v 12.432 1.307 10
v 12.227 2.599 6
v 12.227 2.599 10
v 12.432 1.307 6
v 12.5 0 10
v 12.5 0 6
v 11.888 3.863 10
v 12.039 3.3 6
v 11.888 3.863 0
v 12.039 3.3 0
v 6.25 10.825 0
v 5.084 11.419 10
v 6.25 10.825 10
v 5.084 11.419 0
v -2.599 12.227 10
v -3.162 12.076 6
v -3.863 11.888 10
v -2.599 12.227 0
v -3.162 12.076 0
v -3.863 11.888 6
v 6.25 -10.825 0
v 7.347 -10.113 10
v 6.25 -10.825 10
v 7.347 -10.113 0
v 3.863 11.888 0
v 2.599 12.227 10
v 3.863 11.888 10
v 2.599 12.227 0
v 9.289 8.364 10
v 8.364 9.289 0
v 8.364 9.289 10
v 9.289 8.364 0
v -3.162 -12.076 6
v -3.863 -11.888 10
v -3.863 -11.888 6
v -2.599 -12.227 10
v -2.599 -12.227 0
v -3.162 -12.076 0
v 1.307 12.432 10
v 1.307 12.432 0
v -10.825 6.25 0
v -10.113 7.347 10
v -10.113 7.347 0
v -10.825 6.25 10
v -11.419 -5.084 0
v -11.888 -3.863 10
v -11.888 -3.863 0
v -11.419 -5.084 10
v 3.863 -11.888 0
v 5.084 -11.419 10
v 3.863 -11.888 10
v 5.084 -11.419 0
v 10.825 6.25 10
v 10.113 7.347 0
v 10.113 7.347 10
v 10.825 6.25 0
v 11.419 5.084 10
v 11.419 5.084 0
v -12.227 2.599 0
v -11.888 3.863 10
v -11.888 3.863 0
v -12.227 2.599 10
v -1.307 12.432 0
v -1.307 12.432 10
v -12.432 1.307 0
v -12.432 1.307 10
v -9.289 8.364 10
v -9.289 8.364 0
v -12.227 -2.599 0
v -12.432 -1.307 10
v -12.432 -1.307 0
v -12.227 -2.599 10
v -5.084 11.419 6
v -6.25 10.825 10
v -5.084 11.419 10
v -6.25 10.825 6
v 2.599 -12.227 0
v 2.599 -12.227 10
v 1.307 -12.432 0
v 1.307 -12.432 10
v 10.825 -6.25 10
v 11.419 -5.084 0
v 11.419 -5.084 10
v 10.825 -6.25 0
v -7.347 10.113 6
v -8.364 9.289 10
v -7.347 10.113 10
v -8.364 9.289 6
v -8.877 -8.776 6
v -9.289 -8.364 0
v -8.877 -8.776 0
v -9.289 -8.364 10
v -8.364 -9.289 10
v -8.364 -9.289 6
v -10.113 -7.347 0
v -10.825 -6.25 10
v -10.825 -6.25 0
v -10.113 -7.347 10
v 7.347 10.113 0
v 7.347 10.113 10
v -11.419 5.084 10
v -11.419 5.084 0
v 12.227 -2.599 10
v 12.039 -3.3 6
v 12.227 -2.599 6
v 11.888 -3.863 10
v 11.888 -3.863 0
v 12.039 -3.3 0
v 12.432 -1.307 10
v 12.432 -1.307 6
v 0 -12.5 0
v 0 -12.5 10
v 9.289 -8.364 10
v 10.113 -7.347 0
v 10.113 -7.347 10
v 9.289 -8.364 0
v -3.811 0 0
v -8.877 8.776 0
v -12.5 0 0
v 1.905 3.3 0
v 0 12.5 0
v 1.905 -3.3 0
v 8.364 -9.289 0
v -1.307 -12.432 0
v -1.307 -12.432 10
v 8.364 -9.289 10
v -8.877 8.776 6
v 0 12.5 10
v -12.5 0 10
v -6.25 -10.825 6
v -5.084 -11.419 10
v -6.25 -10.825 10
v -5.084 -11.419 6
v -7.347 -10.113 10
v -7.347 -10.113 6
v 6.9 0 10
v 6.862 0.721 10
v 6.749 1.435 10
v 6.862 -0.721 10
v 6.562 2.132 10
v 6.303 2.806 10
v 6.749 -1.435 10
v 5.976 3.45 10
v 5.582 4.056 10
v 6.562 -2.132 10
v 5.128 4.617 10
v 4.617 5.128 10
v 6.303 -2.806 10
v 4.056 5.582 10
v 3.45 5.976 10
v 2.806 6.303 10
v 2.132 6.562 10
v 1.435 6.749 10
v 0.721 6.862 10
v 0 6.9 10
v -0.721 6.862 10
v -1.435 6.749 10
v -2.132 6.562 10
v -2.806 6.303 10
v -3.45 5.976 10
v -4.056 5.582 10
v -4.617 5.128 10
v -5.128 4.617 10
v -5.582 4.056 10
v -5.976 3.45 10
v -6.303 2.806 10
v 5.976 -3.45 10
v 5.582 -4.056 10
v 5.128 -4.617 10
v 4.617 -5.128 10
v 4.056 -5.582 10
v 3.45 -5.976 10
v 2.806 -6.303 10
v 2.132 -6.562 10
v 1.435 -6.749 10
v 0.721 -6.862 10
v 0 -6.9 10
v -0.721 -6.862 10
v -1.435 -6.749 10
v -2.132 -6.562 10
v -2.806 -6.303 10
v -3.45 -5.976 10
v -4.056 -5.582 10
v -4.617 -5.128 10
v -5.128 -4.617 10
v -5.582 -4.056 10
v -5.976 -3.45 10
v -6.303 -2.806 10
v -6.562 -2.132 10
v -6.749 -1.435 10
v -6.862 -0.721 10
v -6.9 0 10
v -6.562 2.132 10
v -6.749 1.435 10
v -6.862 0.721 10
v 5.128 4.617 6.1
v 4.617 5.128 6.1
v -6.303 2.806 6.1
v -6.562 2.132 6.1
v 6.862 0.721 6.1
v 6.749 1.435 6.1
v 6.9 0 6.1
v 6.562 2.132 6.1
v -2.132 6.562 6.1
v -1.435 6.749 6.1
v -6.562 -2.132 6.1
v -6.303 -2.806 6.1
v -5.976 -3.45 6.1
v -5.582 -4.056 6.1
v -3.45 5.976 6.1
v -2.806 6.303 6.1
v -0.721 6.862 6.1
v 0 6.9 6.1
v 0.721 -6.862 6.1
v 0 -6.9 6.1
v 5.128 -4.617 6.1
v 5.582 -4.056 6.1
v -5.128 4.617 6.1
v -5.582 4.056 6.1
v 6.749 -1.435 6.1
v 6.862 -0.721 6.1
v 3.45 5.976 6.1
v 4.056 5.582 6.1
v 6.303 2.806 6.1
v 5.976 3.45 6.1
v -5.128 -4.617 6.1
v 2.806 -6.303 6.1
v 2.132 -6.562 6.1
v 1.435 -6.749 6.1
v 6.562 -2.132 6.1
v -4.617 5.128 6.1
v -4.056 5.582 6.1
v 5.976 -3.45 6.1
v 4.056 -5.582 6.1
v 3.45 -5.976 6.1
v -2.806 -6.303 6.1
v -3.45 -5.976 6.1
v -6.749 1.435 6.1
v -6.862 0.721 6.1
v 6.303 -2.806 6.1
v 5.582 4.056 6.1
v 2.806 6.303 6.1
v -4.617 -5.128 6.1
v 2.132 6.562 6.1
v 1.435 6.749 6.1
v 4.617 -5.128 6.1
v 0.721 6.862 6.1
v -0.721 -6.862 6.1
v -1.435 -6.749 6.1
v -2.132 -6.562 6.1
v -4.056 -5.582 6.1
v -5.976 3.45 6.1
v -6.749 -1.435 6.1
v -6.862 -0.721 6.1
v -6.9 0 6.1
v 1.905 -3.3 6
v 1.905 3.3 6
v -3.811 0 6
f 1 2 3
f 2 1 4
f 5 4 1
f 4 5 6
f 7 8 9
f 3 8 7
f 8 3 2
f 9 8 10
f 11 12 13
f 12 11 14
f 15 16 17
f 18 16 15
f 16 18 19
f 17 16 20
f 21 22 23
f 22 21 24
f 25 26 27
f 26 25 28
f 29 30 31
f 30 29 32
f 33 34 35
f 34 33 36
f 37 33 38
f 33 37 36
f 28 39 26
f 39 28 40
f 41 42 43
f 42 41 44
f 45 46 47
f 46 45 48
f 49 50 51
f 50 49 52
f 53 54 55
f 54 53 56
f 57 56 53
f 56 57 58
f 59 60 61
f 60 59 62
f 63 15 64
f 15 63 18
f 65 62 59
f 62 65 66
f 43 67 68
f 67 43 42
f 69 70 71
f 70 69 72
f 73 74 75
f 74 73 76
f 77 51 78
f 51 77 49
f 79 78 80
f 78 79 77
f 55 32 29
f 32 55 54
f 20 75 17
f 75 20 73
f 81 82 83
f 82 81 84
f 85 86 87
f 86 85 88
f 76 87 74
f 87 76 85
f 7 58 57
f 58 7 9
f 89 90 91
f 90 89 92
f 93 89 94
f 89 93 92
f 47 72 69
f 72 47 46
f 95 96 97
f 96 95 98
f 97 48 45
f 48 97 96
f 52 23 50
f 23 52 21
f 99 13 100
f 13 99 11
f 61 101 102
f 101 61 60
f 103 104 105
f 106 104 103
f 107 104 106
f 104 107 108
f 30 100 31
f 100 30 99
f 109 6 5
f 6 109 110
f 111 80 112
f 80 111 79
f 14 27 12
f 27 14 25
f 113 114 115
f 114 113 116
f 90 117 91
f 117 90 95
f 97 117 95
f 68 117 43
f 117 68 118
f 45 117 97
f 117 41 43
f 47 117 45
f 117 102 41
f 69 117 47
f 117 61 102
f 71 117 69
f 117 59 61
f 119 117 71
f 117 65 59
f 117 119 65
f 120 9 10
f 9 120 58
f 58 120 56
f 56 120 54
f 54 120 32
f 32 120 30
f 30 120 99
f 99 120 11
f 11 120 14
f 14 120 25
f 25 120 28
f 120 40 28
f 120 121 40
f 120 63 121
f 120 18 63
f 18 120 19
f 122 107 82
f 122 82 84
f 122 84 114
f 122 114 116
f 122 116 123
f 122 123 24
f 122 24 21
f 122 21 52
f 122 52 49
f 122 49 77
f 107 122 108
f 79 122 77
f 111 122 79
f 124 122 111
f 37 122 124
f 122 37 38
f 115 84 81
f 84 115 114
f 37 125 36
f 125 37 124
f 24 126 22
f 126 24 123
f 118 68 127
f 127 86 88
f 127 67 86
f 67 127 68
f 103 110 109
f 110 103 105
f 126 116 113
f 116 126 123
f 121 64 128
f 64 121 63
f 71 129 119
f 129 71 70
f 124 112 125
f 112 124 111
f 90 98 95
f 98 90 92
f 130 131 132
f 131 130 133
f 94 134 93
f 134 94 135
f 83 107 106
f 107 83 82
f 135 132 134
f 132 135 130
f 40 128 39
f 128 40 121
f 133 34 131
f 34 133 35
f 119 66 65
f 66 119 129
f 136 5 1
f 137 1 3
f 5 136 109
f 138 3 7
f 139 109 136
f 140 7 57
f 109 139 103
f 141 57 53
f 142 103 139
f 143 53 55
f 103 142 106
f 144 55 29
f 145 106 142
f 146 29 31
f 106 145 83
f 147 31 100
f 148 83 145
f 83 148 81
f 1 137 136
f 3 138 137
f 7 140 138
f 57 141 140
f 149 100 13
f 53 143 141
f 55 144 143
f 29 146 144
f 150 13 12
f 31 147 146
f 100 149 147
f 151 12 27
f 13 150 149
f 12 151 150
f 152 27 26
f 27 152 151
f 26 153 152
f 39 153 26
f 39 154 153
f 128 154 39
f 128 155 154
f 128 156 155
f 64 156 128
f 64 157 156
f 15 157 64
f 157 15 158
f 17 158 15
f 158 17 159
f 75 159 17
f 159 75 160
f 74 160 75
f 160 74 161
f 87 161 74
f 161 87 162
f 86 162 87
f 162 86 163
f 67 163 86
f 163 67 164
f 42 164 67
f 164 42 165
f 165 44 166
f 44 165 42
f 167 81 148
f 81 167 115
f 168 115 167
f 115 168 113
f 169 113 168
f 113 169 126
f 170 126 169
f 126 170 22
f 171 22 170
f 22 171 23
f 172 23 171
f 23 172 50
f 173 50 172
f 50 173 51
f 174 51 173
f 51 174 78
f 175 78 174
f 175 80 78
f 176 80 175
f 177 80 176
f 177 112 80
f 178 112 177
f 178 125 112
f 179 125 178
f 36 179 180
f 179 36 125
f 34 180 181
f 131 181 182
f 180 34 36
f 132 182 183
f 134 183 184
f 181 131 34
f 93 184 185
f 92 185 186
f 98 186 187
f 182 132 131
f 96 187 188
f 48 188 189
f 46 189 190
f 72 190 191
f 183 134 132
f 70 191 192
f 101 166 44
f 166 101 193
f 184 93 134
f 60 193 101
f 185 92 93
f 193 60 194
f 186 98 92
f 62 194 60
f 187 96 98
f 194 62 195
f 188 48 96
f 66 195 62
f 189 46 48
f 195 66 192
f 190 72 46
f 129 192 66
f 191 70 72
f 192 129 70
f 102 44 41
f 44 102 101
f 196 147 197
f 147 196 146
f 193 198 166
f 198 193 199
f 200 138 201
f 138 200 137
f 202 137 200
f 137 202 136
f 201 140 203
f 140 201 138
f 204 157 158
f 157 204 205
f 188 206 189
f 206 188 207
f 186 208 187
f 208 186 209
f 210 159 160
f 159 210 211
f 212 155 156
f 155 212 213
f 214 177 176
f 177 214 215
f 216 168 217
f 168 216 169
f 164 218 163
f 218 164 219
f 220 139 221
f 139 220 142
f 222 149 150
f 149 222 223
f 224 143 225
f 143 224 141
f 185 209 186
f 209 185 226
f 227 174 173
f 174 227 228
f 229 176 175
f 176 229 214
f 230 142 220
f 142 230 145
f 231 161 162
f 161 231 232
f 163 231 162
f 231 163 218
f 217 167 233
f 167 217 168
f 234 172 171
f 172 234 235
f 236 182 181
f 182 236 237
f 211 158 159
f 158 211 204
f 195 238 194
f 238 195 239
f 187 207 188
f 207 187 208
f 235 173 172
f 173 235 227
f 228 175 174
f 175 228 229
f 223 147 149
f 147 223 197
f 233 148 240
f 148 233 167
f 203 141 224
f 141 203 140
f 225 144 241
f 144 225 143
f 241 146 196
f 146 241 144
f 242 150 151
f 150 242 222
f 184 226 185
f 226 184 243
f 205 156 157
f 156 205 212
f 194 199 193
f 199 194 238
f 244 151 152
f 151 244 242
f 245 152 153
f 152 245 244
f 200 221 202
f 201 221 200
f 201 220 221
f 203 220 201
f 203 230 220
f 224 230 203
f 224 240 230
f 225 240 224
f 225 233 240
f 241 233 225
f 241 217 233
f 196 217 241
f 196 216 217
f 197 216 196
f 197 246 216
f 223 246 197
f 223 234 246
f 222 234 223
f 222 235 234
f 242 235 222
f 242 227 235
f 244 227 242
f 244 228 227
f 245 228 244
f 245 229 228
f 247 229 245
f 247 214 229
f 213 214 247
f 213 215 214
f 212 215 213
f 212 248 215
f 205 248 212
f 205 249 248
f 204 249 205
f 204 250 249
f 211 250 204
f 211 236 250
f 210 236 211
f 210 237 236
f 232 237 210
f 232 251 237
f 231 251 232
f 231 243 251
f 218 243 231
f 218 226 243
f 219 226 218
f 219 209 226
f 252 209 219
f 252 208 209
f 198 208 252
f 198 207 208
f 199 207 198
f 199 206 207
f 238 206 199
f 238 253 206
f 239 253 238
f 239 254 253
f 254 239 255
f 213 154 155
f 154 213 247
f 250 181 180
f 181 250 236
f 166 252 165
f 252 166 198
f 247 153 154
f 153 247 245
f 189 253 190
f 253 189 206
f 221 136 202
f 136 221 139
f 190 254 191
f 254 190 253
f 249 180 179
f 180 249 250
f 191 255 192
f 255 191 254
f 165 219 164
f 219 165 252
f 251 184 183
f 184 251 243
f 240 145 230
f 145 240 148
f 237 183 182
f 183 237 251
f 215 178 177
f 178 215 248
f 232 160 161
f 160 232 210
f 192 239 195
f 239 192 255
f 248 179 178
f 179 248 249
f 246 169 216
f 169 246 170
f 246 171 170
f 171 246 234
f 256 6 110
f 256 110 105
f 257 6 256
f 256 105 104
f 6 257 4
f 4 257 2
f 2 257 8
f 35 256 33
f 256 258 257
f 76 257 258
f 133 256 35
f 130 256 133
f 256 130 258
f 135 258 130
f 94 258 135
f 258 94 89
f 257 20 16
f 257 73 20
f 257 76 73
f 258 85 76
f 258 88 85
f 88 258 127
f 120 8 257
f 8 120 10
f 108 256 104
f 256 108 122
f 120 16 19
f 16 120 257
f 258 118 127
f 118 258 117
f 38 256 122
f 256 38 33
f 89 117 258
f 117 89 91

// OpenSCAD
shaft_insert_height = 4;
shaft_diameter = 12*1.15;

cruz_base_diameter = 25;
cruz_base_height = 10;

arm_length= 150/2;
arm_height = (cruz_base_height - shaft_insert_height);

module shaft_insert(){
    cylinder(shaft_insert_height, d=shaft_diameter, $fn=60);
}
module cruz_base(){
        difference(){
                {cylinder(cruz_base_height, d=cruz_base_diameter, $fn=60);}
                translate([0, 0, cruz_base_height - shaft_insert_height + 0.1]) {shaft_insert();}
            
        }
 }
 
 module arm(){
     translate([0, -arm_height/2, 0]) cube([arm_length, arm_height, arm_height]);
     }
 
 module cruz(){
     difference() {
         {cruz_base();}
         rotate([0, 0, 0]) scale([1.1, 1.1, 1]) {arm();}
         rotate([0, 0, 120]) scale([1, 1.1, 1]) {arm();}
         rotate([0, 0, 240]) scale([1, 1.1, 1]) {arm();}
         }
 }
 
cruz();
